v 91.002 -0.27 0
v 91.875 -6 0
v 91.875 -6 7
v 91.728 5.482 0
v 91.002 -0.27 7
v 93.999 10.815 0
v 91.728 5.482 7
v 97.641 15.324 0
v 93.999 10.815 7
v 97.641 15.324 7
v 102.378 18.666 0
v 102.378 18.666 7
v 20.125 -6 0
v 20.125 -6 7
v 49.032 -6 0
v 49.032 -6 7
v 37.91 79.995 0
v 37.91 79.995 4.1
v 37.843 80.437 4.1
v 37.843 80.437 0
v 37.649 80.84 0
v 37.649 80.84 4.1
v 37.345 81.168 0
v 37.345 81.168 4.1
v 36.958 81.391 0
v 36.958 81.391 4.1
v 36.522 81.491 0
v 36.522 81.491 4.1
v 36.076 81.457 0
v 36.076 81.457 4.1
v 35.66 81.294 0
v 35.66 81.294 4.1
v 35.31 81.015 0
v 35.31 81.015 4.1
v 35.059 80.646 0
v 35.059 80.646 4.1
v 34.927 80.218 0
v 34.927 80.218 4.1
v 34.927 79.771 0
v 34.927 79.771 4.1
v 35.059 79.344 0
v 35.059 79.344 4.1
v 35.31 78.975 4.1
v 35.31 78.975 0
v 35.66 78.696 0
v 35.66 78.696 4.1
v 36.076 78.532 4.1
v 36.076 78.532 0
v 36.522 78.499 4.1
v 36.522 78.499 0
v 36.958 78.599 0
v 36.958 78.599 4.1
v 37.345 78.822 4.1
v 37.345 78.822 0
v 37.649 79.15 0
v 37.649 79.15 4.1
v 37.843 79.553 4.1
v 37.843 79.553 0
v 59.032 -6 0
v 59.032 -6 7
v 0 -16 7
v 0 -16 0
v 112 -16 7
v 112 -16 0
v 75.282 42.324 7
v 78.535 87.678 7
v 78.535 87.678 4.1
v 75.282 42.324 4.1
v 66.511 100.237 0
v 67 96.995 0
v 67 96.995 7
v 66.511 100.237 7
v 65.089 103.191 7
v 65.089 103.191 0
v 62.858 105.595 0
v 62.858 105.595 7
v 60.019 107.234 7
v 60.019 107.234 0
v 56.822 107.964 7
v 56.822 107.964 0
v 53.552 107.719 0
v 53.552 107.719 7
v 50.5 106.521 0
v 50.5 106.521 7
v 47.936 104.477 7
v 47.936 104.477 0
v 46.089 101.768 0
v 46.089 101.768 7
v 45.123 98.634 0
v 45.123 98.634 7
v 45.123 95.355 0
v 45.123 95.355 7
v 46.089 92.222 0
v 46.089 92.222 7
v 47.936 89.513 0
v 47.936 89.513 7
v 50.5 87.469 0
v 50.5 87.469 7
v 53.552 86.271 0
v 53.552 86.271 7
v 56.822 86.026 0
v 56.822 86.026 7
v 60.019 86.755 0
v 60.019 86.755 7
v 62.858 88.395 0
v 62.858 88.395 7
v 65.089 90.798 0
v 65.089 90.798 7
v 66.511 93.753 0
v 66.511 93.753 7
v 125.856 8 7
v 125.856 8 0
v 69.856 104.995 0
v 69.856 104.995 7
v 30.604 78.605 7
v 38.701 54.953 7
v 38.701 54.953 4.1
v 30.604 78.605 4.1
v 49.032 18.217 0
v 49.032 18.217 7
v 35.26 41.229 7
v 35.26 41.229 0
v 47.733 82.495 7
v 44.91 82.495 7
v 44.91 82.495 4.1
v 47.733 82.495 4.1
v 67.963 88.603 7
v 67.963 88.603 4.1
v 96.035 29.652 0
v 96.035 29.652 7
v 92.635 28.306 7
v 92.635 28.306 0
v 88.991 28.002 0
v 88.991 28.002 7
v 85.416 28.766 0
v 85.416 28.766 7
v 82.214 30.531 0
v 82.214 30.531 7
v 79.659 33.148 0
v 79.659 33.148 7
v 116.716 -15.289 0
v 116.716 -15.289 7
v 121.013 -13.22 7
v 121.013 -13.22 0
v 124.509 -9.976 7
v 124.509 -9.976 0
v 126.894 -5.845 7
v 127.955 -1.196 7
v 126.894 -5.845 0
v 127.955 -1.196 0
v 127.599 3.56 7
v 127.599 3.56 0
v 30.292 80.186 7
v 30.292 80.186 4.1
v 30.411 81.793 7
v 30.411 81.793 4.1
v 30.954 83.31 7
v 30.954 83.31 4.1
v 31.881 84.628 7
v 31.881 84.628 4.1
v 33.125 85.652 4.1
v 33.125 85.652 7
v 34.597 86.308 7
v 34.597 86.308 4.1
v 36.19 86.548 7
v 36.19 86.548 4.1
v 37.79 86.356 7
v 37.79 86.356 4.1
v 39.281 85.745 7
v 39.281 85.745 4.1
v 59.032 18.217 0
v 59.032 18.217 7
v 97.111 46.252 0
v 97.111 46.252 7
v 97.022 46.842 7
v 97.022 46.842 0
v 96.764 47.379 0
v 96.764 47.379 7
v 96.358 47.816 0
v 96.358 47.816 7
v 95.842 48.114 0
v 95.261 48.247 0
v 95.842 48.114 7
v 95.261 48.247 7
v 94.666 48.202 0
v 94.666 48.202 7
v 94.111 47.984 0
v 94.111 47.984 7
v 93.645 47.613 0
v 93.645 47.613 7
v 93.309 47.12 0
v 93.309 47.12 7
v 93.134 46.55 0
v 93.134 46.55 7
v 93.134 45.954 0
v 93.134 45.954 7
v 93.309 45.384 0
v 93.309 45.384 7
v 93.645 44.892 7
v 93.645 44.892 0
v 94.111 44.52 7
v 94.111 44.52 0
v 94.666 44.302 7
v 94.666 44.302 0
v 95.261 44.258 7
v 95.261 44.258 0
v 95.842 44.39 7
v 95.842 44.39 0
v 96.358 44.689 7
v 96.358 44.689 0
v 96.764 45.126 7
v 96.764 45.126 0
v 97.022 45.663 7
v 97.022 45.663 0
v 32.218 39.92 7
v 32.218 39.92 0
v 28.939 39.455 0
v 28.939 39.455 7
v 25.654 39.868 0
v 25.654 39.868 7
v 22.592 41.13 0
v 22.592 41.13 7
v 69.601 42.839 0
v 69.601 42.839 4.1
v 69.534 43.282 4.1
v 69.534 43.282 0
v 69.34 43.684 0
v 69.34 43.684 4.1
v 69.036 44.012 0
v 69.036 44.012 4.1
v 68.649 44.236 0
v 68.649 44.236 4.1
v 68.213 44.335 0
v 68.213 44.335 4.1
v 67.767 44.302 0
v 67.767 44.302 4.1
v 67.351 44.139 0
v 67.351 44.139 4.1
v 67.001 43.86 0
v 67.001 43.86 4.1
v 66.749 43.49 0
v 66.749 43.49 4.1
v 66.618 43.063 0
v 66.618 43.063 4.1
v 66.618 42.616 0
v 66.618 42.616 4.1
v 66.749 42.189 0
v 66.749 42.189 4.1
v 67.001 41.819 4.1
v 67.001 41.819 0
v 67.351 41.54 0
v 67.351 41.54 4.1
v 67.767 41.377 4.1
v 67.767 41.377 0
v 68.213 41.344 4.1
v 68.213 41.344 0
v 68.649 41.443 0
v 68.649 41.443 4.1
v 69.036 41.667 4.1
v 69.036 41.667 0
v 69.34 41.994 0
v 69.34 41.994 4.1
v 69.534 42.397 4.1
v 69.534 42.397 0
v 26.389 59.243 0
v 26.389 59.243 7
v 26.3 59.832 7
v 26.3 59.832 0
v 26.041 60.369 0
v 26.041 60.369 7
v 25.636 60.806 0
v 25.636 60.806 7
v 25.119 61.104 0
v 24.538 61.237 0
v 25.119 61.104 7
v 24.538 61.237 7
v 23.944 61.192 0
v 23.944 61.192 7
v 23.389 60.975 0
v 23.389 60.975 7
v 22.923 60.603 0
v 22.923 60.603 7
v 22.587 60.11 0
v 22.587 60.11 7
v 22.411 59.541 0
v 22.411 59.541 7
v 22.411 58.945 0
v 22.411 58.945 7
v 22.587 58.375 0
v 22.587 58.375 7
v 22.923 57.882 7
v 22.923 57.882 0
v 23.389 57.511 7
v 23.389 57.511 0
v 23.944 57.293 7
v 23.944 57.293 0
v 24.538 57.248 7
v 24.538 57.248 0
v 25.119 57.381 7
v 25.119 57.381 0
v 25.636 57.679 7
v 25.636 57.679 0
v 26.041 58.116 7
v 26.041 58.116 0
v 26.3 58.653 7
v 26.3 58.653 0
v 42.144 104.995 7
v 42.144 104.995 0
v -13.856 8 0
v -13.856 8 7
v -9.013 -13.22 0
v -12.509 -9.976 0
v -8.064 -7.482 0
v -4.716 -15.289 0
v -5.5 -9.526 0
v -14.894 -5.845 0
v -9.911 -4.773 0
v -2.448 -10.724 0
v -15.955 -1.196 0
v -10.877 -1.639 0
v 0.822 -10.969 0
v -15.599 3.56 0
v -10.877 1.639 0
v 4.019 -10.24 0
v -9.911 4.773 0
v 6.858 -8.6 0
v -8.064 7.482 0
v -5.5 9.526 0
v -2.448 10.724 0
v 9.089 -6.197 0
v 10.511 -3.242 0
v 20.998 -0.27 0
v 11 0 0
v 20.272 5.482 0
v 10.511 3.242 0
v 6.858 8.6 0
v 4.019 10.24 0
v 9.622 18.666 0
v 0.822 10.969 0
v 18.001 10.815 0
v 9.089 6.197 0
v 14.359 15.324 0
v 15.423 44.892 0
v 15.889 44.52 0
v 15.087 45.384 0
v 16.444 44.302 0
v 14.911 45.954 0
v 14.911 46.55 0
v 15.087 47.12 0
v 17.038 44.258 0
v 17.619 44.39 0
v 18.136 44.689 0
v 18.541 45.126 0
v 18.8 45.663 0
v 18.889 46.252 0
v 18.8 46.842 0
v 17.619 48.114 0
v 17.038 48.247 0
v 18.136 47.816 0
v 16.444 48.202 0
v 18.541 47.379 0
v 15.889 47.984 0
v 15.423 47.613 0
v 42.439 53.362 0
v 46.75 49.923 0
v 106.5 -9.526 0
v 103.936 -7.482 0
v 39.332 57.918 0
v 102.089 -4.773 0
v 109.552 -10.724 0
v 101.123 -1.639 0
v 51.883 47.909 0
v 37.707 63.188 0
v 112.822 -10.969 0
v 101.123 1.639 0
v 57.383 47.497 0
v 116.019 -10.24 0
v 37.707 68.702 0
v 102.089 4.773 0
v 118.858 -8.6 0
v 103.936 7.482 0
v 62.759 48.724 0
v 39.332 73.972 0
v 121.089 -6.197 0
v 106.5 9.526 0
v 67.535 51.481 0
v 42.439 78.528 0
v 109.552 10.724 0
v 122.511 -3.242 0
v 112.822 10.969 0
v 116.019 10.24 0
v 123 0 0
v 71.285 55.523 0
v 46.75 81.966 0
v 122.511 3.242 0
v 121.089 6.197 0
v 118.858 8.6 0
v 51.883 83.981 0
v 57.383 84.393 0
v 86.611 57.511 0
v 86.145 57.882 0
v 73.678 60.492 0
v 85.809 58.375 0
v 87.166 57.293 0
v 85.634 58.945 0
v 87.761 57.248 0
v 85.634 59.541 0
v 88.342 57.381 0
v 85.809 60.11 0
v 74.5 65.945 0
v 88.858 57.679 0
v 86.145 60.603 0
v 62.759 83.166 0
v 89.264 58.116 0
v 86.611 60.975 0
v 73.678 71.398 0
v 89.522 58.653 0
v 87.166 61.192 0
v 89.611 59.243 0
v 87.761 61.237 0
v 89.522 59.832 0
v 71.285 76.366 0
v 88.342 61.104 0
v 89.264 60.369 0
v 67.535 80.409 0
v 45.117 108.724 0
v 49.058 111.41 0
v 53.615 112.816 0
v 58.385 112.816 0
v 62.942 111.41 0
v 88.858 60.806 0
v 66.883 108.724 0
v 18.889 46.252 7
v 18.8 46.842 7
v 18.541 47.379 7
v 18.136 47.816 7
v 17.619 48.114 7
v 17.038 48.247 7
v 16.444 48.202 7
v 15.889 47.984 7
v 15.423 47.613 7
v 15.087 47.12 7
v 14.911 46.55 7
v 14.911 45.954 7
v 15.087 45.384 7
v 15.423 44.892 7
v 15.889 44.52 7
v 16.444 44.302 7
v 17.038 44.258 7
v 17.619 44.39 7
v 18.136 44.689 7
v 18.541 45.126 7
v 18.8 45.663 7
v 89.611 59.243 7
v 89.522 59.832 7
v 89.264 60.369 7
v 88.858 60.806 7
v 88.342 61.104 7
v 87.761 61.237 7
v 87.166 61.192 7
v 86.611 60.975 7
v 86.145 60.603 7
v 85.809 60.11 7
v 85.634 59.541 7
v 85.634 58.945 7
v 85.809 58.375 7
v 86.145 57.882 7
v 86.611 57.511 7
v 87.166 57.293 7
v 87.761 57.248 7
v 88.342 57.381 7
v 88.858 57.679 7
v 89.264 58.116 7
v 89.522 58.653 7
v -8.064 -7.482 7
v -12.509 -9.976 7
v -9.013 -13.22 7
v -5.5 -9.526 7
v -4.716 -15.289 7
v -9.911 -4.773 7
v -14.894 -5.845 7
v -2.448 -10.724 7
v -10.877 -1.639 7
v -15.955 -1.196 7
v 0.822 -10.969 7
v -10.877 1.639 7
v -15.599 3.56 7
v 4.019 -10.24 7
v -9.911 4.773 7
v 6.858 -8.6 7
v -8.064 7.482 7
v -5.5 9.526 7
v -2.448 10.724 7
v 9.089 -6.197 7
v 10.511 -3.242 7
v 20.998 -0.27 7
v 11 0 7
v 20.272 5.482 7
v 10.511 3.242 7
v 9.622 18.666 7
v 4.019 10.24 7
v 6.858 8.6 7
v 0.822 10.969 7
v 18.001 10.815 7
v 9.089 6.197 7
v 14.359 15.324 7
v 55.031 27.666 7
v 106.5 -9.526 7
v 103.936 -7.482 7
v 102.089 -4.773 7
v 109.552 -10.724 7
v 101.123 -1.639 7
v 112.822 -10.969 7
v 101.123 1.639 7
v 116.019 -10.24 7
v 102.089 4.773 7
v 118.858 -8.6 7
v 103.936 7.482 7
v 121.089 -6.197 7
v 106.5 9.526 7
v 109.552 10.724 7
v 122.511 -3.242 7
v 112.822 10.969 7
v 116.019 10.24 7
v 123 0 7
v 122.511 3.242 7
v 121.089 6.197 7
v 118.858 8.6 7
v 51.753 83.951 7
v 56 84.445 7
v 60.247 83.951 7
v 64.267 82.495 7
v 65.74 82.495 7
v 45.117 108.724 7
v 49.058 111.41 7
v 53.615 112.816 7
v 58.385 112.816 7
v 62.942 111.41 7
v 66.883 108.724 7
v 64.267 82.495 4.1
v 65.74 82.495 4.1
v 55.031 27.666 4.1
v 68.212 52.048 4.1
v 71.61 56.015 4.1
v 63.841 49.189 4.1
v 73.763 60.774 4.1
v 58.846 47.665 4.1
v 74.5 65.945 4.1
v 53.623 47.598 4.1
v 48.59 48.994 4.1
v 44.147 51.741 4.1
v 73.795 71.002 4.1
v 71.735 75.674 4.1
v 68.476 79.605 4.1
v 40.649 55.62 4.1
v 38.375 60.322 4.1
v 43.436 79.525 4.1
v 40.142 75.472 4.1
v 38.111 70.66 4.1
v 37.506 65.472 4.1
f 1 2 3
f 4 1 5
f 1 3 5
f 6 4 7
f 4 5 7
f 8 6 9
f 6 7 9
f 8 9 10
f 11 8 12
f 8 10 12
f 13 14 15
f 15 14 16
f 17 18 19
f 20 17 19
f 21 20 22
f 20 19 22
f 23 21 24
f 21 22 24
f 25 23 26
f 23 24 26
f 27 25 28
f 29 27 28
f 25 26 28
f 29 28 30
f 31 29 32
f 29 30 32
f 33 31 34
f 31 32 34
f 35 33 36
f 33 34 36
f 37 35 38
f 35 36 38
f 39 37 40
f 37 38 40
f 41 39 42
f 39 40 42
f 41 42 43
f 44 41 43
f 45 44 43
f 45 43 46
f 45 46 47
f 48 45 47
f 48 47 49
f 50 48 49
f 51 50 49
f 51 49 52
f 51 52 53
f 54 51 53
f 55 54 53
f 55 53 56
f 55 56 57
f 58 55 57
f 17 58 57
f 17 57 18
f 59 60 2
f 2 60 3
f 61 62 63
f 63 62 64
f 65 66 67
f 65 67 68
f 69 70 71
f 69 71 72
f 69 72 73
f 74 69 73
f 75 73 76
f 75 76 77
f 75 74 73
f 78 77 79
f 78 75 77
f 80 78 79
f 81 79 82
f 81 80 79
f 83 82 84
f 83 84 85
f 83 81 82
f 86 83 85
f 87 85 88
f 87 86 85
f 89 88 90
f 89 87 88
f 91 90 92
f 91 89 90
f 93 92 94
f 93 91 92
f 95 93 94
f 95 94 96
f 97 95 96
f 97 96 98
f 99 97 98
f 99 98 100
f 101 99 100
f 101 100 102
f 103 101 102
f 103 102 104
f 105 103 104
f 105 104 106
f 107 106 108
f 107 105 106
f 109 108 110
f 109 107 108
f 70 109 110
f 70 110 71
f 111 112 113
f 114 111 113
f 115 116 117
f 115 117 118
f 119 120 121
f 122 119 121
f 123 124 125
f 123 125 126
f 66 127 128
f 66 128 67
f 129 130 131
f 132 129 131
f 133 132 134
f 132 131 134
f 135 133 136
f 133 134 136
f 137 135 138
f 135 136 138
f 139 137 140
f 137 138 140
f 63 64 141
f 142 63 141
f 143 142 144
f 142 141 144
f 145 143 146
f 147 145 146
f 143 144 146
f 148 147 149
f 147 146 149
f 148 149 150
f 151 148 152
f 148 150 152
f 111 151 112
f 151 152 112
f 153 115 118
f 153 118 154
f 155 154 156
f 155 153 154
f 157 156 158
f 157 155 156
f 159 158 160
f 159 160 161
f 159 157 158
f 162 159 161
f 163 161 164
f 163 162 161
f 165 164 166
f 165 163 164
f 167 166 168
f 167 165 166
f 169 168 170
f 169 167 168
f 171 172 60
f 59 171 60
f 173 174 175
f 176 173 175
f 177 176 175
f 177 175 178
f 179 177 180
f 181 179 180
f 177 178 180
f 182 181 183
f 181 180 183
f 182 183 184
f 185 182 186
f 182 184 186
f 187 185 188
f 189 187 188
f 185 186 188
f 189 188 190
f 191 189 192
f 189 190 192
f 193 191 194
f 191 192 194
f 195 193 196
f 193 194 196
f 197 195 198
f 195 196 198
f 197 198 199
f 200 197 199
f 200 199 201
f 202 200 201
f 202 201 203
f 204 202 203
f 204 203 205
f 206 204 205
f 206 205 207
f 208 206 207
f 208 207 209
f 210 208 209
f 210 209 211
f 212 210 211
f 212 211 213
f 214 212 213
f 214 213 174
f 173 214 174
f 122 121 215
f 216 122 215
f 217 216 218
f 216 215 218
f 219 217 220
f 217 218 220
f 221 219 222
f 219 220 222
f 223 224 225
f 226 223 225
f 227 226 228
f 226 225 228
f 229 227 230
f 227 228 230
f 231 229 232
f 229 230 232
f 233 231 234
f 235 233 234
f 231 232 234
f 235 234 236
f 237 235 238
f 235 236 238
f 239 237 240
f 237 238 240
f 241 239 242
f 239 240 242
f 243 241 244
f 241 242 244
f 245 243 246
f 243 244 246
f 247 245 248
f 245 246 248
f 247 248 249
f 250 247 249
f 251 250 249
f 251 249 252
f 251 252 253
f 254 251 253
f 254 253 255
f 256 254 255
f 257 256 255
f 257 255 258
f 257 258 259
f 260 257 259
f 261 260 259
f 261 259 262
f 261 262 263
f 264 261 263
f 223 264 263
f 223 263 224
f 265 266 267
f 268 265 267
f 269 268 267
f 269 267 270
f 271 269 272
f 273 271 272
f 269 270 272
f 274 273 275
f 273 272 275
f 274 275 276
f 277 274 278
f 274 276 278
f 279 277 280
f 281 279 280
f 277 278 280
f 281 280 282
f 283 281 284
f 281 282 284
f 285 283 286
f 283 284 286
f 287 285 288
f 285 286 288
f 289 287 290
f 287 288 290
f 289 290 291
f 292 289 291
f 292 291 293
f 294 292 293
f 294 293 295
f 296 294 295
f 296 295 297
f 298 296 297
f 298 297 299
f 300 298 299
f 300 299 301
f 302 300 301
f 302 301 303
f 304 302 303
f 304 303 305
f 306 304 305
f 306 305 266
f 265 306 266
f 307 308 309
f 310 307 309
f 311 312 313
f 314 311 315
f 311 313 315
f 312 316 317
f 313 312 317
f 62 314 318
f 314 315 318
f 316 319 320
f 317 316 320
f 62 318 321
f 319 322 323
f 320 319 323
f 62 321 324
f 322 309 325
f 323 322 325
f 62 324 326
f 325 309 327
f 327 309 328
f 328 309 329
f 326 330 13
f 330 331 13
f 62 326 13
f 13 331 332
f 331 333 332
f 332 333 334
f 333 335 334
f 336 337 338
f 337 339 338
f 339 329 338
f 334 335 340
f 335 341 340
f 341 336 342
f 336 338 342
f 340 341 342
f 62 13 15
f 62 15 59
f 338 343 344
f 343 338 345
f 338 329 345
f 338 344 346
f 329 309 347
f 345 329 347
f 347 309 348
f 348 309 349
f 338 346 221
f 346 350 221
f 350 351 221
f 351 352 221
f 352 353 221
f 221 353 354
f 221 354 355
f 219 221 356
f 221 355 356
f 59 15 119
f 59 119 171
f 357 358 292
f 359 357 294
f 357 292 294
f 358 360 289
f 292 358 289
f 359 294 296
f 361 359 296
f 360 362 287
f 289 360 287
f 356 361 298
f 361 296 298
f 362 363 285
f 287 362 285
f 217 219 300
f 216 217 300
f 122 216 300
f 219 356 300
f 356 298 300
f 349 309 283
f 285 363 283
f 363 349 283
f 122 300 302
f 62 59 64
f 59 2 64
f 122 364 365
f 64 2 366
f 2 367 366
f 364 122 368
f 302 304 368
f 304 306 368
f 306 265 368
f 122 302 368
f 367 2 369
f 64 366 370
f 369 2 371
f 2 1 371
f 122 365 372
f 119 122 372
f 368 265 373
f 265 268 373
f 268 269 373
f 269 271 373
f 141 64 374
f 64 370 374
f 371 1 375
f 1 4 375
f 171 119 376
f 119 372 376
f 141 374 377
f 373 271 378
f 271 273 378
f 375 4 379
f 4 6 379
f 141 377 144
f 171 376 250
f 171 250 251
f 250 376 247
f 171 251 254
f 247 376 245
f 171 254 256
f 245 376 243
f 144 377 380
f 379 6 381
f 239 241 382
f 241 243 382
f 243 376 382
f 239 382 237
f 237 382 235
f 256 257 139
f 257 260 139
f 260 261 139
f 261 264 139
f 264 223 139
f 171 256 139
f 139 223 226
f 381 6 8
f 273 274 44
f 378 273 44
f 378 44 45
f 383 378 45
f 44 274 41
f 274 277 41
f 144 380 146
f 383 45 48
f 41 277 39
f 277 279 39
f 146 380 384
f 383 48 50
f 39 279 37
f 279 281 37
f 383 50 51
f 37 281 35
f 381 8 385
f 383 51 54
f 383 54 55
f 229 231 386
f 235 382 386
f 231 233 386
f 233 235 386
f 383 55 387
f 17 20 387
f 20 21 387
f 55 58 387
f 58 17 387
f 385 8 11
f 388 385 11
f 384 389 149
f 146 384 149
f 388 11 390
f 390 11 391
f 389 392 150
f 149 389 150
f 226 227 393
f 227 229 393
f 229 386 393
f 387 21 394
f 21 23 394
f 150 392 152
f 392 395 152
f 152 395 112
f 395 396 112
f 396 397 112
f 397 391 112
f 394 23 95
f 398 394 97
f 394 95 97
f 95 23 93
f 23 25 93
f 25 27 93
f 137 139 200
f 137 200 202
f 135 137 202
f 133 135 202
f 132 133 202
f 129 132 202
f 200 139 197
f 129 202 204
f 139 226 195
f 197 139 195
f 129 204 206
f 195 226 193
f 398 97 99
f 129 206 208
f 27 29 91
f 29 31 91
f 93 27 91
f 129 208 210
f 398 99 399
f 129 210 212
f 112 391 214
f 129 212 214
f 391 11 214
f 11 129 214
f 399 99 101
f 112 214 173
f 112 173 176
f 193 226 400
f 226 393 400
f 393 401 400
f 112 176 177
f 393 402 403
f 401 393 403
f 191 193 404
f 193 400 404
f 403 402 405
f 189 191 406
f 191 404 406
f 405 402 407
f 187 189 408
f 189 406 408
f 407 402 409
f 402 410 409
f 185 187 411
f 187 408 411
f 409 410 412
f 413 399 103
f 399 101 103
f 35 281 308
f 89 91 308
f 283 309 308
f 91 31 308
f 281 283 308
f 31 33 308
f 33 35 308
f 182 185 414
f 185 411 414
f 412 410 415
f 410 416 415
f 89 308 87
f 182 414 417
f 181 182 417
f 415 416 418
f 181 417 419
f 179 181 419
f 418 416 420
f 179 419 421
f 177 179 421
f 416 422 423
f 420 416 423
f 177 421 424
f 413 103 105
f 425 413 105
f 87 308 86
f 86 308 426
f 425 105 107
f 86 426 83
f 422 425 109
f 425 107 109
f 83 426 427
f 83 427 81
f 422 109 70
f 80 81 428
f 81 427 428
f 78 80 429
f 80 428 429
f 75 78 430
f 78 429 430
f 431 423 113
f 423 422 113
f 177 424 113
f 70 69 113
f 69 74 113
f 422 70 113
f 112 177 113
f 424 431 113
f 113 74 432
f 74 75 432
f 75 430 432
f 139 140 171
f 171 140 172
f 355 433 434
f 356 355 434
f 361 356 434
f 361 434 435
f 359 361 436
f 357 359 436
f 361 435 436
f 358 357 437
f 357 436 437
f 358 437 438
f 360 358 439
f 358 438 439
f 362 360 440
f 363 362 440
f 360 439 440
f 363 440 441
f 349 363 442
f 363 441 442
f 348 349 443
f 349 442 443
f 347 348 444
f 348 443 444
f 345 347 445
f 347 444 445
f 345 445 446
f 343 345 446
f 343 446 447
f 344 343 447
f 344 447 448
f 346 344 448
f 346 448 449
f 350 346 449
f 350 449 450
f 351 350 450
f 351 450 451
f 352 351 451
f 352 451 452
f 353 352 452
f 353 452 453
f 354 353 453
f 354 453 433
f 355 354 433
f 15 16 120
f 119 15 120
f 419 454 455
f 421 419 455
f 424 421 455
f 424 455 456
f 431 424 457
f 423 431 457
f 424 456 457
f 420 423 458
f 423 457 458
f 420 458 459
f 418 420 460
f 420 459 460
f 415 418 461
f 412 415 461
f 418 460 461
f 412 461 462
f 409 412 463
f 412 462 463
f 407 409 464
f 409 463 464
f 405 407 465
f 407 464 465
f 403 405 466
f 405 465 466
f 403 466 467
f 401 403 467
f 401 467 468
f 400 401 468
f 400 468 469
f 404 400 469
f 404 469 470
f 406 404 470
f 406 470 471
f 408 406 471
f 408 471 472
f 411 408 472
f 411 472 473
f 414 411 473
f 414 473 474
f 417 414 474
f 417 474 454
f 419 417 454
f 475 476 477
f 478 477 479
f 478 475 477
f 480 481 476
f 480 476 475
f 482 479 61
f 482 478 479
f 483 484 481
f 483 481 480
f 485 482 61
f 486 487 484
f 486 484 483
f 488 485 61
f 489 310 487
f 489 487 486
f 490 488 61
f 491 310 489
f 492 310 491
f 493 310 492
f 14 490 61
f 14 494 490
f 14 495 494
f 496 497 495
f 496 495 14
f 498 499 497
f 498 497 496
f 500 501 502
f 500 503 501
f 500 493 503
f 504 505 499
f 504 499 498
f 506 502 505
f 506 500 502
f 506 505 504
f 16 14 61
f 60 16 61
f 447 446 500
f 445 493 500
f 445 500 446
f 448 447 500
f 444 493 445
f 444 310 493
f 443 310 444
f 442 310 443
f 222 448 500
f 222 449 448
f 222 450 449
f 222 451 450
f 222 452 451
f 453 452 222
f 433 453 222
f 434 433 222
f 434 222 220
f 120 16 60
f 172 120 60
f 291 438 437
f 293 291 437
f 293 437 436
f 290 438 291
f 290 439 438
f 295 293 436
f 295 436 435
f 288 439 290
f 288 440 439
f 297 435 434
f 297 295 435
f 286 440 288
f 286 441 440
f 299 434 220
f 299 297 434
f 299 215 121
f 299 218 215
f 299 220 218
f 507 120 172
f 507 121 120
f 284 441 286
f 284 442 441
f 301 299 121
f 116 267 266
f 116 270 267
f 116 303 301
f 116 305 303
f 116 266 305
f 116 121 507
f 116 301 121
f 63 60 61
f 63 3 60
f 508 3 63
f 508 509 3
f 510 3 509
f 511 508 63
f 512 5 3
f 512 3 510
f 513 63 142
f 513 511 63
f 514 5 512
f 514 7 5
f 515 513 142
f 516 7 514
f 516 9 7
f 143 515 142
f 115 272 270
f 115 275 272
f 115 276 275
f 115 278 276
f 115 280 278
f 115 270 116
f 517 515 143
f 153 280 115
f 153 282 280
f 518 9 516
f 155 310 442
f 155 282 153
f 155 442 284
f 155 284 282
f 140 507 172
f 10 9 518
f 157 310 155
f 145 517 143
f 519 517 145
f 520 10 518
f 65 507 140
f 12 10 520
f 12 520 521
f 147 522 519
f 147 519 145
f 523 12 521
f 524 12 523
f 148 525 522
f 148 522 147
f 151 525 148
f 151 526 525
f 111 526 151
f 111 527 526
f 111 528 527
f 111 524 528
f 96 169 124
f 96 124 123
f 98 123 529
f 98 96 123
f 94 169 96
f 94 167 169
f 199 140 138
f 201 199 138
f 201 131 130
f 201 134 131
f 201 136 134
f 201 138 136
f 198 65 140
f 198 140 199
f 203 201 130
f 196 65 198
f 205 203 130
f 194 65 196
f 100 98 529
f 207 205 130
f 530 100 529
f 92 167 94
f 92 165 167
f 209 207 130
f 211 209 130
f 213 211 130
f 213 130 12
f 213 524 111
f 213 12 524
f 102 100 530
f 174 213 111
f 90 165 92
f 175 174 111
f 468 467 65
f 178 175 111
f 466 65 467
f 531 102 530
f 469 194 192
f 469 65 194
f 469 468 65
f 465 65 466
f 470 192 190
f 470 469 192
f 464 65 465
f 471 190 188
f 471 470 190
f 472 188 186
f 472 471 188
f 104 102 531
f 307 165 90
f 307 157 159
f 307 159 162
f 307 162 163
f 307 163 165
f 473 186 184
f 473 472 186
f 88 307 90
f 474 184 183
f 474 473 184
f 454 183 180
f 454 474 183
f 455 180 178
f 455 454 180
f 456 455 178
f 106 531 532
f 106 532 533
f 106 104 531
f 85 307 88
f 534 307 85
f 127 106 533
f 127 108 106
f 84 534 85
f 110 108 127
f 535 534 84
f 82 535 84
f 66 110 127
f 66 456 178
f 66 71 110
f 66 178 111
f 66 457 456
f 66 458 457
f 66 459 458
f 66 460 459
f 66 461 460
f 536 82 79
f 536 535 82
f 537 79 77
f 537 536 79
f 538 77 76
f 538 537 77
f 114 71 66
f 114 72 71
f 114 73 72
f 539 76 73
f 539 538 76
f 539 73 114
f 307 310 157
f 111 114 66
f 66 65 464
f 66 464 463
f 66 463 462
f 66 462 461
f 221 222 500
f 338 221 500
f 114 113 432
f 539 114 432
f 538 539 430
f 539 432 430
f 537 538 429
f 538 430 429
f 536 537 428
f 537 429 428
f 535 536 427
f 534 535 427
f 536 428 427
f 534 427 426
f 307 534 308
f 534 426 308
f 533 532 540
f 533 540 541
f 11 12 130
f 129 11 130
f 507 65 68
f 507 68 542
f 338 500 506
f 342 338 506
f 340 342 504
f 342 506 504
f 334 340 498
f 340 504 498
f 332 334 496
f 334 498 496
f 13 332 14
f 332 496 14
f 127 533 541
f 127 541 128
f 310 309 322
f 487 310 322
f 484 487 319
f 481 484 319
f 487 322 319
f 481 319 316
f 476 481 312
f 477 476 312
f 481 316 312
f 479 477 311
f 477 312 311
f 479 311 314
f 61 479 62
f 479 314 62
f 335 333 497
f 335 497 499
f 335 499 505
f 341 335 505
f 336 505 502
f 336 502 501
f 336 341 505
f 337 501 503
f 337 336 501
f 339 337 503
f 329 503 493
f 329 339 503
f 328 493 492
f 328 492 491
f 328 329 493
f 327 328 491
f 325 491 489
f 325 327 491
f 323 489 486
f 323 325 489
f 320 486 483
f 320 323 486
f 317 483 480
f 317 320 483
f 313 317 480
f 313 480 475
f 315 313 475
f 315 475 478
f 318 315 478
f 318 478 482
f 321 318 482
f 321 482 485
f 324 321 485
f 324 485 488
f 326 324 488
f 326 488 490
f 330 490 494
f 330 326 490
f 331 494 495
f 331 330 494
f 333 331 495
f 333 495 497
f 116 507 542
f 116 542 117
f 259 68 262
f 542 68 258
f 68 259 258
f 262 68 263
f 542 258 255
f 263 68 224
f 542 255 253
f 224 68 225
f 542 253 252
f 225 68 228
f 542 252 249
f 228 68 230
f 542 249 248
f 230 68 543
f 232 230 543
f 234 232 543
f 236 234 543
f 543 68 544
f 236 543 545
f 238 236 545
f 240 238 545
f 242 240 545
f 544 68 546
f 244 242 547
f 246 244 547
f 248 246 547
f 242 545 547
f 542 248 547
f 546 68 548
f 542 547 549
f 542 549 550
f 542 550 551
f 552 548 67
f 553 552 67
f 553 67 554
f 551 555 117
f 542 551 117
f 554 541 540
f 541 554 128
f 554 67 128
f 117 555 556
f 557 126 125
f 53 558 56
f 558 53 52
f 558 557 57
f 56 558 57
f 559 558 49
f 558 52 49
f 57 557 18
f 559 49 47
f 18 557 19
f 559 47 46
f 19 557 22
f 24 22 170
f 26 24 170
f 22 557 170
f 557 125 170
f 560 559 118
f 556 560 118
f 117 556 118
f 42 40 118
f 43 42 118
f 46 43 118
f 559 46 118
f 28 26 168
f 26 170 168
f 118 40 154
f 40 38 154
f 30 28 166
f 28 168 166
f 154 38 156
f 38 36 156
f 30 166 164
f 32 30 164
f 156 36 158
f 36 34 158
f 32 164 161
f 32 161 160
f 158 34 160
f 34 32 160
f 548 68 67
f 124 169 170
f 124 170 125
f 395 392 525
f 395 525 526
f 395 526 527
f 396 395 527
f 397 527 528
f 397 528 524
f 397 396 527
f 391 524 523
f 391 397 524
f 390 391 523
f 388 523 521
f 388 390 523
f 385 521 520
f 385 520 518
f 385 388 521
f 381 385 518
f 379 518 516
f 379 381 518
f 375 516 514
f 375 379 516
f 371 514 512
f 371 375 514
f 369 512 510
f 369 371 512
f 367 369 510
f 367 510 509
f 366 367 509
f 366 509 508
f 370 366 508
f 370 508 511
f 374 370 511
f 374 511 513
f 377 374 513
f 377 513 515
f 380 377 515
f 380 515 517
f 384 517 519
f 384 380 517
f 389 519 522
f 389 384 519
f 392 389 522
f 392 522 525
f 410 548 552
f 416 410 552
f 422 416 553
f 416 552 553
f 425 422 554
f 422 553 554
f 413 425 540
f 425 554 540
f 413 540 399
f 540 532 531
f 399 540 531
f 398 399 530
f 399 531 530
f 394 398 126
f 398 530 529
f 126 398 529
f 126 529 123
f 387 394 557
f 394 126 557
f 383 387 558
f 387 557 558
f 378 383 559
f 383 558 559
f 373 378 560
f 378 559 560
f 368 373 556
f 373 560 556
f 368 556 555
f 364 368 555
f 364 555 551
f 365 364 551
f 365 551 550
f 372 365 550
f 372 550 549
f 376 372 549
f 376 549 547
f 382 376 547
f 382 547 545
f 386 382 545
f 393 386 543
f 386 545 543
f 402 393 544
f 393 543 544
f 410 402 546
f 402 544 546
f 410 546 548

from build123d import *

# Parameters (mm, degrees)
SKETCH1_R           = 11
BOSS_EXTRUDE1_DEPTH = 7
SKETCH3_R           = 18.5
CUT_EXTRUDE1_DEPTH  = 8
CUT_EXTRUDE2_DEPTH  = 2.9
CUT_EXTRUDE3_DEPTH  = 8
SKETCH7_R           = 1.5
CUT_EXTRUDE4_DEPTH  = 5.1
SKETCH10_R          = 2
CUT_EXTRUDE5_DEPTH  = 8


with BuildPart() as part:
    # Sketch1 → Boss-Extrude1 (new body)
    with BuildSketch(Plane.XY):
        with BuildLine():
            Line((42.143593539, 104.994845224), (-13.856406461, 8))
            ThreePointArc((-13.856406461, 8), (-13.856406461, -8), (0, -16))
            Line((0, -16), (112, -16))
            ThreePointArc((112, -16), (125.856406461, -8), (125.856406461, 8))
            Line((125.856406461, 8), (69.856406461, 104.994845224))
            ThreePointArc((69.856406461, 104.994845224), (56, 112.994845224), (42.143593539, 104.994845224))
        make_face()
        Circle(SKETCH1_R, mode=Mode.SUBTRACT)
        with Locations((112, 0)):
            Circle(SKETCH1_R, mode=Mode.SUBTRACT)
        with Locations((56, 96.994845224)):
            Circle(SKETCH1_R, mode=Mode.SUBTRACT)
    extrude(amount=BOSS_EXTRUDE1_DEPTH)

    # Sketch3 → Cut-Extrude1 (cut, through all)
    with BuildSketch(Plane.XY.offset(7)):
        with Locations((56, 65.944845224)):
            Circle(SKETCH3_R)
    extrude(amount=-CUT_EXTRUDE1_DEPTH, mode=Mode.SUBTRACT)

    # Sketch4 → Cut-Extrude2 (cut)
    with BuildSketch(Plane.XY.offset(7)):
        with BuildLine():
            Line((44.91, 82.494845224), (65.74, 82.494845224))
            Line((65.74, 82.494845224), (67.963130932, 88.602847259))
            Line((67.963130932, 88.602847259), (78.535172855, 87.67791344))
            Line((78.535172855, 87.67791344), (75.282447168, 42.324405576))
            Line((75.282447168, 42.324405576), (55.030844768, 27.665872217))
            Line((55.030844768, 27.665872217), (38.701277947, 54.952961607))
            Line((38.701277947, 54.952961607), (30.604248297, 78.605405685))
            ThreePointArc((30.604248297, 78.605405685), (32.46849594, 85.181842037), (39.280834875, 85.744845224))
            Line((39.280834875, 85.744845224), (44.91, 82.494845224))
        make_face()
    extrude(amount=-CUT_EXTRUDE2_DEPTH, mode=Mode.SUBTRACT)

    # Sketch5 → Cut-Extrude3 (cut, through all)
    with BuildSketch(Plane.XY.offset(7)):
        with BuildLine():
            Line((22.59151766, 41.129656408), (9.622063078, 18.665902125))
            ThreePointArc((9.622063078, 18.665902125), (19.321434948, 8.226916285), (20.124611797, -6))
            Line((20.124611797, -6), (49.031546624, -6))
            Line((49.031546624, -6), (49.031546624, 18.216961725))
            Line((49.031546624, 18.216961725), (35.260372543, 41.228916805))
            ThreePointArc((35.260372543, 41.228916805), (28.939452074, 39.455357607), (22.59151766, 41.129656408))
        make_face()
        with BuildLine():
            Line((59.031546624, 18.216961725), (59.031546624, -6))
            Line((59.031546624, -6), (91.875388203, -6))
            ThreePointArc((91.875388203, -6), (92.678565052, 8.226916285), (102.377936922, 18.665902125))
            Line((102.377936922, 18.665902125), (96.035225677, 29.651800259))
            ThreePointArc((96.035225677, 29.651800259), (87.175426517, 28.252595389), (79.659424477, 33.147851127))
            Line((79.659424477, 33.147851127), (59.031546624, 18.216961725))
        make_face()
    extrude(amount=-CUT_EXTRUDE3_DEPTH, mode=Mode.SUBTRACT)

    # Sketch7 → Cut-Extrude4 (cut, through all)
    with BuildSketch(Plane.XY.offset(4.1)):
        with Locations((68.100893251, 42.839462205)):
            Circle(SKETCH7_R)
        with Locations((36.41, 79.994845224)):
            Circle(SKETCH7_R)
    extrude(amount=-CUT_EXTRUDE4_DEPTH, mode=Mode.SUBTRACT)

    # Sketch10 → Cut-Extrude5 (cut, through all)
    with BuildSketch(Plane.XY.offset(7)):
        with Locations((24.388784068, 59.24261314)):
            Circle(SKETCH10_R)
        with Locations((16.888784068, 46.252232084)):
            Circle(SKETCH10_R)
        with Locations((87.611215932, 59.24261314)):
            Circle(SKETCH10_R)
        with Locations((95.111215932, 46.252232084)):
            Circle(SKETCH10_R)
    extrude(amount=-CUT_EXTRUDE5_DEPTH, mode=Mode.SUBTRACT)


solid = part.part
